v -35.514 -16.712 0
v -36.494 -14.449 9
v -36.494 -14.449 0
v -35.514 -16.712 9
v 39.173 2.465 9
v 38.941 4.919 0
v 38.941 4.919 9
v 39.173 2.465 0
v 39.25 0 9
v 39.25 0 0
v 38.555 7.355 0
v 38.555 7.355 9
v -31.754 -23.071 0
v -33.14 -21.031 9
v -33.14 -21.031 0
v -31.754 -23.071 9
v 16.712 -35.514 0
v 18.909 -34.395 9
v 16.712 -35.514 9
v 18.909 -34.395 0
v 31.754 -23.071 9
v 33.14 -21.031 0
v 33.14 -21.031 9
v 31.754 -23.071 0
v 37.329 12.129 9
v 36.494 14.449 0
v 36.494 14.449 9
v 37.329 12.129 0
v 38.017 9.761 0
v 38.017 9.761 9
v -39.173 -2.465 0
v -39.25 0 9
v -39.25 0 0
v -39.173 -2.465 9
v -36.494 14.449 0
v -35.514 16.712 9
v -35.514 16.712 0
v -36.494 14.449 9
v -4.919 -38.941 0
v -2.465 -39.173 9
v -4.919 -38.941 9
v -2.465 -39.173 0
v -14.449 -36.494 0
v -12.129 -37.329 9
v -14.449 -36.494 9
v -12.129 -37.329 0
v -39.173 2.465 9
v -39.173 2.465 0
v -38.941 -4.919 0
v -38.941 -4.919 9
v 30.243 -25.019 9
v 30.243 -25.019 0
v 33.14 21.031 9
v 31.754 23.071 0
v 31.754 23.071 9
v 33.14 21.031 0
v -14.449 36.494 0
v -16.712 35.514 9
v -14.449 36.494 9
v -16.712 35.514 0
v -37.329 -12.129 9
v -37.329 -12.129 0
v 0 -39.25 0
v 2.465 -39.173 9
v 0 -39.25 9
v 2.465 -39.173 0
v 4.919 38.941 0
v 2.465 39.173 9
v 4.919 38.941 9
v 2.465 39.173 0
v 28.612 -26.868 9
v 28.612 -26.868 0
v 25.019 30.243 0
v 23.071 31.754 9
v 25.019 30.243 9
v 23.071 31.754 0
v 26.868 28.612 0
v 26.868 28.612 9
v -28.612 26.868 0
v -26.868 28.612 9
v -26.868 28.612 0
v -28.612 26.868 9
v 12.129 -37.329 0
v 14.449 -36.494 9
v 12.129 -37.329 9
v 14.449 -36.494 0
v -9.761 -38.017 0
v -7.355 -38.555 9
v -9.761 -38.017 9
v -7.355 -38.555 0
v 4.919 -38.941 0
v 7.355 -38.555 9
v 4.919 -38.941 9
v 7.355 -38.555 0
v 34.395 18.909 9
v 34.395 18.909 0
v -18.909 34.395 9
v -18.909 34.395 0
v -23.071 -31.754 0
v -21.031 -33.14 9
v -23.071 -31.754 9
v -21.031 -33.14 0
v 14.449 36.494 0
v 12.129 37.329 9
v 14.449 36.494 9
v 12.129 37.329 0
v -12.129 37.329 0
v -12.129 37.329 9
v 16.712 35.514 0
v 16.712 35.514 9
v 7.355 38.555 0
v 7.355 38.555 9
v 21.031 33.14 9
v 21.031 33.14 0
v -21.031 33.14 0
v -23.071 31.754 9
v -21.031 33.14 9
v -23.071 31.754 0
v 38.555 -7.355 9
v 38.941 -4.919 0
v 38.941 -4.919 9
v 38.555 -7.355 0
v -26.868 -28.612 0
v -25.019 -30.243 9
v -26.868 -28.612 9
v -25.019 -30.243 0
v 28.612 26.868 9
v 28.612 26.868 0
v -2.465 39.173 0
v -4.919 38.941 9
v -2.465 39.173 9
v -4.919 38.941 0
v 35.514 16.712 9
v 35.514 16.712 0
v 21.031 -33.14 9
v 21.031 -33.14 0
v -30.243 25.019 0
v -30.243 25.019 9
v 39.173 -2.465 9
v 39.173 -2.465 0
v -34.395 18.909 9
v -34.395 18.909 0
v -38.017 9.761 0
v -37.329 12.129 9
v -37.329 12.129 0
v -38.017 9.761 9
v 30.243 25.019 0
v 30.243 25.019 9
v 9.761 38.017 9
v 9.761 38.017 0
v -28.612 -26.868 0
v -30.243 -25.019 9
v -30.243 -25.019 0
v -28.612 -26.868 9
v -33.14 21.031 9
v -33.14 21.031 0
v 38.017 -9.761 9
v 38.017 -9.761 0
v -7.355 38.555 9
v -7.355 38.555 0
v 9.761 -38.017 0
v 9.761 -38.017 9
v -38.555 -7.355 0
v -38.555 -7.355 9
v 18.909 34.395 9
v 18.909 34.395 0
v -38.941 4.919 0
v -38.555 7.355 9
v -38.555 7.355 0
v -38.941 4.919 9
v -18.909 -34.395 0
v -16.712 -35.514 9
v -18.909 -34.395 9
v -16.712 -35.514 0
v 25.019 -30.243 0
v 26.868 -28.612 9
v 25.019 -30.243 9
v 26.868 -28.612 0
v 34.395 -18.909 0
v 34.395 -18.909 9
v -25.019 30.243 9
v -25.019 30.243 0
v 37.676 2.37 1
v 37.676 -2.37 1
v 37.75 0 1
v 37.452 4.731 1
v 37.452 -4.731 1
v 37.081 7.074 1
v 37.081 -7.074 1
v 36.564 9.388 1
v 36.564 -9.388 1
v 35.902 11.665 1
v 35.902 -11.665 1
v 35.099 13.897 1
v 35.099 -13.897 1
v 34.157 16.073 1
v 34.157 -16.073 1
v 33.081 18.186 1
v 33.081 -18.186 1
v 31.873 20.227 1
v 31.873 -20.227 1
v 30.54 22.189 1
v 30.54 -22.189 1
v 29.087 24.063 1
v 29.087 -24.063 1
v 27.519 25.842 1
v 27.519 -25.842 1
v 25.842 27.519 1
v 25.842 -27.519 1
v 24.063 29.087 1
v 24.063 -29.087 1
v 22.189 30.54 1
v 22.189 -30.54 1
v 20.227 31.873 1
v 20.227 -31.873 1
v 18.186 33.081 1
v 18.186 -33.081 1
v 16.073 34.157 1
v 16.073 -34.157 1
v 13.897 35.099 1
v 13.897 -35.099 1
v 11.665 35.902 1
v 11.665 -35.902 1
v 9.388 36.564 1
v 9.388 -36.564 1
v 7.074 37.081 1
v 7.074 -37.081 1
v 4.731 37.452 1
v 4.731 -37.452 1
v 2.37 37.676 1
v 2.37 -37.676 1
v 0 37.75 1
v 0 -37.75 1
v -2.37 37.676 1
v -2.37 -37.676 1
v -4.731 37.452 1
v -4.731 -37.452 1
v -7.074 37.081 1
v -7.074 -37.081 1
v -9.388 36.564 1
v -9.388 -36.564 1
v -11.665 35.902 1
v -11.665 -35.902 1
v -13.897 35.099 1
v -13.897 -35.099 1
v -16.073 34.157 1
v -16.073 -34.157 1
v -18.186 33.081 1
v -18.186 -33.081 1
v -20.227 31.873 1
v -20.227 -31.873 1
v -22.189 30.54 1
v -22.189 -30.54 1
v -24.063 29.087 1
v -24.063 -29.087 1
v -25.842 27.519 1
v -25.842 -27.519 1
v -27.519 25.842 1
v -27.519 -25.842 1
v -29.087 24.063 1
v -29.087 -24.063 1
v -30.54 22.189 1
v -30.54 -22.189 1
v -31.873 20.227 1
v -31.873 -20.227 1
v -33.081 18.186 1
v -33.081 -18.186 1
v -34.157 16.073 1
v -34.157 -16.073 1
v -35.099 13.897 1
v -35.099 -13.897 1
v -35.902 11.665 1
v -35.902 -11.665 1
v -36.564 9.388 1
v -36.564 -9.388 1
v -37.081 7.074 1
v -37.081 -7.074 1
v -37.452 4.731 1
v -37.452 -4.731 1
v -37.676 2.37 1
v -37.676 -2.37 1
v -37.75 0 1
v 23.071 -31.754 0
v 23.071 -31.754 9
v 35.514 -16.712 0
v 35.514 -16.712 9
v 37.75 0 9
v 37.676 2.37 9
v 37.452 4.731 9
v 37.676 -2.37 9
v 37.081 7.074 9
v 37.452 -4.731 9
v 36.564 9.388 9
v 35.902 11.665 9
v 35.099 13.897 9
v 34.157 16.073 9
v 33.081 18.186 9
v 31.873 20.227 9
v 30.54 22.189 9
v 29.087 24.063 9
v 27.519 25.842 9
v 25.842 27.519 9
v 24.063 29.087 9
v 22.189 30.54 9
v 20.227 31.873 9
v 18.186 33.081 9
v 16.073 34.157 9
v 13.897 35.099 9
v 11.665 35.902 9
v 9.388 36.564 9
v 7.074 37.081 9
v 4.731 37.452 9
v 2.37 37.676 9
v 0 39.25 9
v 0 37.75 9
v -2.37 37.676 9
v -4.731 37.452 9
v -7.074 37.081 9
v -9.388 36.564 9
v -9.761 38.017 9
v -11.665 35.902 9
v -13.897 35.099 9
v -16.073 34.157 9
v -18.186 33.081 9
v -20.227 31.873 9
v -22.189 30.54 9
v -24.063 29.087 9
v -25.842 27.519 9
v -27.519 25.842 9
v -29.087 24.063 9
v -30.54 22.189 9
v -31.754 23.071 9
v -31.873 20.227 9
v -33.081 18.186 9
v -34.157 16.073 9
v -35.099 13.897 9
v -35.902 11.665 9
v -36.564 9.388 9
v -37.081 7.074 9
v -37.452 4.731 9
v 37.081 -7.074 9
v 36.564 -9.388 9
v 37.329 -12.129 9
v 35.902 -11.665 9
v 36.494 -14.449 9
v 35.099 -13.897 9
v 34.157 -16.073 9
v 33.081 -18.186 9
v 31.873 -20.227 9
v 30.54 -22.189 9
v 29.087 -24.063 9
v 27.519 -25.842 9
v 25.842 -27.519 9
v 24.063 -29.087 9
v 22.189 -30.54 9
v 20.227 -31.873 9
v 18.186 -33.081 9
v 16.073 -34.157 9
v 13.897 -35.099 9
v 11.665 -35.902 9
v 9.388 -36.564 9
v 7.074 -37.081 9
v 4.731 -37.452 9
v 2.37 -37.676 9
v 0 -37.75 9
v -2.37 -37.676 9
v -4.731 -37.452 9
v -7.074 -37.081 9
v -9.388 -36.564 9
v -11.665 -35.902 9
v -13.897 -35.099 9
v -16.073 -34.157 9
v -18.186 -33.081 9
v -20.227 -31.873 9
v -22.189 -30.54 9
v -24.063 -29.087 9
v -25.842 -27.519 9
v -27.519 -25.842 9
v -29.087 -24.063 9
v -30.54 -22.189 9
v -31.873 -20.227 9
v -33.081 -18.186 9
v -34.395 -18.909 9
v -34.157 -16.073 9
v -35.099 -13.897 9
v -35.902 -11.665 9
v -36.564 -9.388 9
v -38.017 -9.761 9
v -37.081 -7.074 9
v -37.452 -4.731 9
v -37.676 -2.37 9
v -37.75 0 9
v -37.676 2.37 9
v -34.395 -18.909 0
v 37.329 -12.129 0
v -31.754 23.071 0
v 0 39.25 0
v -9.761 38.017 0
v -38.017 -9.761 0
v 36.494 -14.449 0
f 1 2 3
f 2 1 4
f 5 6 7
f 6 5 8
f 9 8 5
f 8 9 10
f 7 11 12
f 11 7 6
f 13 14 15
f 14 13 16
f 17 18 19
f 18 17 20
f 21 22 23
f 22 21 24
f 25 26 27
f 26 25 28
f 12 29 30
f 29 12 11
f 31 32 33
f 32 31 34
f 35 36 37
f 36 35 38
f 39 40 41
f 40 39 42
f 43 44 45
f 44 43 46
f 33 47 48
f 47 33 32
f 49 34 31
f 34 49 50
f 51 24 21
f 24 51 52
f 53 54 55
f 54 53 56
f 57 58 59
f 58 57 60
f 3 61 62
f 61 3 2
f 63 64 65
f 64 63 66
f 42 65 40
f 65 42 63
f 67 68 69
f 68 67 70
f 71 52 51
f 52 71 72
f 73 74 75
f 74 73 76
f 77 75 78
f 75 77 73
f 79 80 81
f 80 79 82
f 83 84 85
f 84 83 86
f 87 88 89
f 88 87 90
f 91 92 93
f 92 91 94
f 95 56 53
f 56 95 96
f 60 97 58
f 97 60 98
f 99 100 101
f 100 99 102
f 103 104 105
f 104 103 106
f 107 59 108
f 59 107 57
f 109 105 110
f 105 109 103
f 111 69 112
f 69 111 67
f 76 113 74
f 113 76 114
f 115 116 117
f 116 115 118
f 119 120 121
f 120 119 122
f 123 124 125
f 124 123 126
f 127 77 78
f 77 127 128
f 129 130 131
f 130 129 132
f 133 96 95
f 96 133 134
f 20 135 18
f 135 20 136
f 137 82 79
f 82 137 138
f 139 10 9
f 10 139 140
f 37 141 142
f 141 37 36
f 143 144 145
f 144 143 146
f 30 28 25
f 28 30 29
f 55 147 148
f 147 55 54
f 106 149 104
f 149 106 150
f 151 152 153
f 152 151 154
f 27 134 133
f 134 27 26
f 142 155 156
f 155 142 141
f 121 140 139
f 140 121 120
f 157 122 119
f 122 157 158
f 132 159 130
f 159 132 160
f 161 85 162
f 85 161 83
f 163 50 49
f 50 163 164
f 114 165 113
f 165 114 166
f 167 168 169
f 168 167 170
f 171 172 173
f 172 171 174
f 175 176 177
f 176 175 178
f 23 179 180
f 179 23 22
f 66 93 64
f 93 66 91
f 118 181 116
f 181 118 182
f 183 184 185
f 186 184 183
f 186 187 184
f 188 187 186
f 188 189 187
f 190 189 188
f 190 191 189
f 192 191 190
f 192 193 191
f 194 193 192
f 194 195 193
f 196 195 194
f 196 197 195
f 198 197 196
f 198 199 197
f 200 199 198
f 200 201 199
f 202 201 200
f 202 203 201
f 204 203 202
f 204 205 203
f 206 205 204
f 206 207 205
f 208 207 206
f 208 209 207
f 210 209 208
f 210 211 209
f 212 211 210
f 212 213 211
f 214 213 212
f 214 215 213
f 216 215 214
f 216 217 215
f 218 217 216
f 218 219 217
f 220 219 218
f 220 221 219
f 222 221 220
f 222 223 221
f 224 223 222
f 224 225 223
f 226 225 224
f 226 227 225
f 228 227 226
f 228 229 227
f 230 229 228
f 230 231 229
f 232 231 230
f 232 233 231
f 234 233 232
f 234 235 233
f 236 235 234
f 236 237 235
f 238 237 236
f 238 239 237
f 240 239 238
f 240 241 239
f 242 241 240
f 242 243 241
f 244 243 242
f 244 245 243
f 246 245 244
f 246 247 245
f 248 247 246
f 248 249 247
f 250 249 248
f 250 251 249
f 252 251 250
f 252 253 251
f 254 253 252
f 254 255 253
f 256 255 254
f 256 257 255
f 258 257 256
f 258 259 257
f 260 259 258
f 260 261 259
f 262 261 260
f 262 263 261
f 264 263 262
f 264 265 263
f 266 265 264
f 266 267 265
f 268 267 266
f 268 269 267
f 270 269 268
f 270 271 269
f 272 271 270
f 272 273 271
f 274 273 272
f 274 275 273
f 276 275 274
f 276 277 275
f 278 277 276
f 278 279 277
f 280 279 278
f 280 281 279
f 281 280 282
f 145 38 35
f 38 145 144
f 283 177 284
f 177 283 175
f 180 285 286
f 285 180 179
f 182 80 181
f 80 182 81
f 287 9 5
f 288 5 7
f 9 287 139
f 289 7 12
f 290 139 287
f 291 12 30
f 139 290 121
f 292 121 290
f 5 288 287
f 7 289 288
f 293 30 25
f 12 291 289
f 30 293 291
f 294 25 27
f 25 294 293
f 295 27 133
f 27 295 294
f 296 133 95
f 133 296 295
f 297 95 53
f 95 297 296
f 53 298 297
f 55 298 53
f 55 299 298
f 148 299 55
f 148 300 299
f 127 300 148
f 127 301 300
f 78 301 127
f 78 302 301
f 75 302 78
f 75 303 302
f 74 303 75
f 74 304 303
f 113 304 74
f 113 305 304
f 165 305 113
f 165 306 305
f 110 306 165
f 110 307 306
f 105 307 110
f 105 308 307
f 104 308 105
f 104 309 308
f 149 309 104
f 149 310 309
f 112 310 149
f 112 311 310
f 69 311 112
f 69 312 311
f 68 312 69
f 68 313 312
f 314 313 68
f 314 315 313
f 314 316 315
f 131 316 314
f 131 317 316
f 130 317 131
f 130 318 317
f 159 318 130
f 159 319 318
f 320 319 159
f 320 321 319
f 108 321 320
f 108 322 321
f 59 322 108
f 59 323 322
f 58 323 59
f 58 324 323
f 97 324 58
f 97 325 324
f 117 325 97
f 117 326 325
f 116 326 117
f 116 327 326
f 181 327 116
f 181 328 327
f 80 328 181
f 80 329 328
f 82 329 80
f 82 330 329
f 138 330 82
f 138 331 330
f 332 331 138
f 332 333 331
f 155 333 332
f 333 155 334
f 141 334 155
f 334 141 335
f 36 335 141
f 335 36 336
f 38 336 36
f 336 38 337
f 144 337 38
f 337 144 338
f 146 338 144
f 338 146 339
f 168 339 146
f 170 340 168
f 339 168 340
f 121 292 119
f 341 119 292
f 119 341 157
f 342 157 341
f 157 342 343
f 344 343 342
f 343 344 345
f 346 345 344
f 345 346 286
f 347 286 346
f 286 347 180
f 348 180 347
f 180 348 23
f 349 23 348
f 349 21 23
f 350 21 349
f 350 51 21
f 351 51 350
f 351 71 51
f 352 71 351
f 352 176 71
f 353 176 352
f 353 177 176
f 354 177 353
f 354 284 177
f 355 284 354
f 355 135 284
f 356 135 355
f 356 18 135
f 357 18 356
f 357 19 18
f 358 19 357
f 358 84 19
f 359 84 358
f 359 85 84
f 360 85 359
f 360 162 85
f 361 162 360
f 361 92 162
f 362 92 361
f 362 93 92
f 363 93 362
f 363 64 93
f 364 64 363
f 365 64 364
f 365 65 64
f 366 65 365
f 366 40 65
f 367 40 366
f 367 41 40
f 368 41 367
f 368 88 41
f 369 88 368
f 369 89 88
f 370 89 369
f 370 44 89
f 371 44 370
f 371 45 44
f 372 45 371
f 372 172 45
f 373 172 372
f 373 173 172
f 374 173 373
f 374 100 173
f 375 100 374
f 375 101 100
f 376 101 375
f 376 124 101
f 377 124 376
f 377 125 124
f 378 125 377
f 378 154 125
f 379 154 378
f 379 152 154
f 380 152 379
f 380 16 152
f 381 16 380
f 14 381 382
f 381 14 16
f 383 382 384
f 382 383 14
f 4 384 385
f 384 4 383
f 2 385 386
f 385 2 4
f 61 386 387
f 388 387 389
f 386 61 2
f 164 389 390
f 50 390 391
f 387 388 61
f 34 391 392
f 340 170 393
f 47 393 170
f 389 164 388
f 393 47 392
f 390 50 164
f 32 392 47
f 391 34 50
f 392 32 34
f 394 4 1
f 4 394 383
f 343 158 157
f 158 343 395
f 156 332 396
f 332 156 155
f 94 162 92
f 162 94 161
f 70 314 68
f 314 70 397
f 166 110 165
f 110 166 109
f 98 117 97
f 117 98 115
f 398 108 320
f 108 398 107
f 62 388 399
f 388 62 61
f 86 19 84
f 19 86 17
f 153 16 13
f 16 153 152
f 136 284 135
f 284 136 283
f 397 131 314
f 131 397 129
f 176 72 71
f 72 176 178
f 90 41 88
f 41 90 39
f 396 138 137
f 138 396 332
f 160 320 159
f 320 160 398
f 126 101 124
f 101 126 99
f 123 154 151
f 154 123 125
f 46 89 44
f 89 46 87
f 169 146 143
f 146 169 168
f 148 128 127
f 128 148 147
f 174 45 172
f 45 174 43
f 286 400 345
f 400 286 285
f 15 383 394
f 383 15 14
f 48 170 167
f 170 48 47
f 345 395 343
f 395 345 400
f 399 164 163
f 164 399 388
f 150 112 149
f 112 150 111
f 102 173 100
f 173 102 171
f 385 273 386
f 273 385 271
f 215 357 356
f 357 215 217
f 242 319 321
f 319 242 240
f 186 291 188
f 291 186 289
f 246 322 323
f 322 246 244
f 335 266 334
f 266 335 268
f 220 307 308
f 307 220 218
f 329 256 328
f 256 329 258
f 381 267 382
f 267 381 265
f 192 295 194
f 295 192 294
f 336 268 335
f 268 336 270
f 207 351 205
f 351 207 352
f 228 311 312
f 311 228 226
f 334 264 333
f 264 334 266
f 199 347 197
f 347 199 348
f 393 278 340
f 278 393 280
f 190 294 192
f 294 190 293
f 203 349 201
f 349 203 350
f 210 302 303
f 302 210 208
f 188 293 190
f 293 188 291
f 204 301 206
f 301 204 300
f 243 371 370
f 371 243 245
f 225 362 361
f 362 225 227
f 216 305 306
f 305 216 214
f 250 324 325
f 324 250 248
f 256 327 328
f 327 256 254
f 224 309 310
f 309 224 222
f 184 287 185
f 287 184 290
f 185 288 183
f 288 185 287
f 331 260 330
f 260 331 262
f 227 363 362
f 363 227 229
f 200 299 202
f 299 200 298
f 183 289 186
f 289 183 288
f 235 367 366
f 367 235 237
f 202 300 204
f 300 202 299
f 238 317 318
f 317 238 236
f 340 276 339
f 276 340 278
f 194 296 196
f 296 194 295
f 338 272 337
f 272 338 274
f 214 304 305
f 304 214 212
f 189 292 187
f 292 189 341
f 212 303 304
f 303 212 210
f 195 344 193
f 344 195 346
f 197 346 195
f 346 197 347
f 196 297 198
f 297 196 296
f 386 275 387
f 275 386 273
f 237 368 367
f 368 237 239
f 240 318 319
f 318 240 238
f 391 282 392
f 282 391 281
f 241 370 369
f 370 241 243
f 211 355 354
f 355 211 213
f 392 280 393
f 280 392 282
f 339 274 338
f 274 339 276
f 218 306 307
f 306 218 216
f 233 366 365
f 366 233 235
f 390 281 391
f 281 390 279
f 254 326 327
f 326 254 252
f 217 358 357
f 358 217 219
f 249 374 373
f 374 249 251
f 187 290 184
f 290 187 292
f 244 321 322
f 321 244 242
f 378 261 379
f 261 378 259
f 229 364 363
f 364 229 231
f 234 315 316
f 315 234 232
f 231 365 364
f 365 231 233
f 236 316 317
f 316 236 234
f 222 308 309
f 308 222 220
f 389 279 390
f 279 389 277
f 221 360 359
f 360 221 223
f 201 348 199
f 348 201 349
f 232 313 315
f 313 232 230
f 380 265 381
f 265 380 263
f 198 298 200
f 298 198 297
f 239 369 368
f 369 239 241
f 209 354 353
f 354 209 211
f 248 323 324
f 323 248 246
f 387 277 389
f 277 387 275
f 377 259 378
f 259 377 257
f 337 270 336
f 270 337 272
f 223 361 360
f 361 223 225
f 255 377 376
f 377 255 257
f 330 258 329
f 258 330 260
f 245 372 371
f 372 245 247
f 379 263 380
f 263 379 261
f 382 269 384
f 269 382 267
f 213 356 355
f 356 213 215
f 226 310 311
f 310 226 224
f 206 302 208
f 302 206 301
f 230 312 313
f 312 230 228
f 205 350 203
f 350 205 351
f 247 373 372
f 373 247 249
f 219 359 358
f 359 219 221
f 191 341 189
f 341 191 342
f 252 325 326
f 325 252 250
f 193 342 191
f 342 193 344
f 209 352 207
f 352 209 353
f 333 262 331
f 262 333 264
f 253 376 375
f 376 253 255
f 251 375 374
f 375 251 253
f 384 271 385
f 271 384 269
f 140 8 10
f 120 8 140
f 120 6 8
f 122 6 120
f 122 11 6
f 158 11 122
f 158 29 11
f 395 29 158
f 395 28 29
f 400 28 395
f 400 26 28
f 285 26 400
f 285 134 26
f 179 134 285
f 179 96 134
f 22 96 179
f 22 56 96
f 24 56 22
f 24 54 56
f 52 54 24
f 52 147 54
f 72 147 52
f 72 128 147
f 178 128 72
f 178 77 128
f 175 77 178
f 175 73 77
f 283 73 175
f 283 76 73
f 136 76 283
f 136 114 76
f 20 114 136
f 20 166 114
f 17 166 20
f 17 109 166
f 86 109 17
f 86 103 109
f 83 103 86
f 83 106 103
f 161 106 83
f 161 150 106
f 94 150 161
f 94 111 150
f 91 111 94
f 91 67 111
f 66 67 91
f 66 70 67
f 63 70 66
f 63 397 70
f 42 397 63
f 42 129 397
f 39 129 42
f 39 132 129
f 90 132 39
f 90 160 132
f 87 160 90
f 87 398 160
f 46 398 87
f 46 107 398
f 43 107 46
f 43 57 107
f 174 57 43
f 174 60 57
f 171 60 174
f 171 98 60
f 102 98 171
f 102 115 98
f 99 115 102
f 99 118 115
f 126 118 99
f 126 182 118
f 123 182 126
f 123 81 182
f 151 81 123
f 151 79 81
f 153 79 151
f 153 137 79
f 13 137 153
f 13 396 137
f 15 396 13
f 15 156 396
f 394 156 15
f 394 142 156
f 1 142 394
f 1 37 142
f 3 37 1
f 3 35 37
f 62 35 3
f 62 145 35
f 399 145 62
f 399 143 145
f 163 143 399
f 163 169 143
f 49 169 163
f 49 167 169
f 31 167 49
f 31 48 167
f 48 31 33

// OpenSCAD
$fn = 100;

hole_diameter = 75.5;
edge_thickness = 1.5;
edge_height = 8;
base_height = 1;

internal_radius = hole_diameter / 2;
external_radius = internal_radius + edge_thickness;

cylinder(h = base_height, r = external_radius);

translate([ 0, 0, base_height ]) difference() {
  cylinder(h = edge_height, r = external_radius);
  cylinder(h = edge_height + .01, r = hole_diameter / 2);
}
